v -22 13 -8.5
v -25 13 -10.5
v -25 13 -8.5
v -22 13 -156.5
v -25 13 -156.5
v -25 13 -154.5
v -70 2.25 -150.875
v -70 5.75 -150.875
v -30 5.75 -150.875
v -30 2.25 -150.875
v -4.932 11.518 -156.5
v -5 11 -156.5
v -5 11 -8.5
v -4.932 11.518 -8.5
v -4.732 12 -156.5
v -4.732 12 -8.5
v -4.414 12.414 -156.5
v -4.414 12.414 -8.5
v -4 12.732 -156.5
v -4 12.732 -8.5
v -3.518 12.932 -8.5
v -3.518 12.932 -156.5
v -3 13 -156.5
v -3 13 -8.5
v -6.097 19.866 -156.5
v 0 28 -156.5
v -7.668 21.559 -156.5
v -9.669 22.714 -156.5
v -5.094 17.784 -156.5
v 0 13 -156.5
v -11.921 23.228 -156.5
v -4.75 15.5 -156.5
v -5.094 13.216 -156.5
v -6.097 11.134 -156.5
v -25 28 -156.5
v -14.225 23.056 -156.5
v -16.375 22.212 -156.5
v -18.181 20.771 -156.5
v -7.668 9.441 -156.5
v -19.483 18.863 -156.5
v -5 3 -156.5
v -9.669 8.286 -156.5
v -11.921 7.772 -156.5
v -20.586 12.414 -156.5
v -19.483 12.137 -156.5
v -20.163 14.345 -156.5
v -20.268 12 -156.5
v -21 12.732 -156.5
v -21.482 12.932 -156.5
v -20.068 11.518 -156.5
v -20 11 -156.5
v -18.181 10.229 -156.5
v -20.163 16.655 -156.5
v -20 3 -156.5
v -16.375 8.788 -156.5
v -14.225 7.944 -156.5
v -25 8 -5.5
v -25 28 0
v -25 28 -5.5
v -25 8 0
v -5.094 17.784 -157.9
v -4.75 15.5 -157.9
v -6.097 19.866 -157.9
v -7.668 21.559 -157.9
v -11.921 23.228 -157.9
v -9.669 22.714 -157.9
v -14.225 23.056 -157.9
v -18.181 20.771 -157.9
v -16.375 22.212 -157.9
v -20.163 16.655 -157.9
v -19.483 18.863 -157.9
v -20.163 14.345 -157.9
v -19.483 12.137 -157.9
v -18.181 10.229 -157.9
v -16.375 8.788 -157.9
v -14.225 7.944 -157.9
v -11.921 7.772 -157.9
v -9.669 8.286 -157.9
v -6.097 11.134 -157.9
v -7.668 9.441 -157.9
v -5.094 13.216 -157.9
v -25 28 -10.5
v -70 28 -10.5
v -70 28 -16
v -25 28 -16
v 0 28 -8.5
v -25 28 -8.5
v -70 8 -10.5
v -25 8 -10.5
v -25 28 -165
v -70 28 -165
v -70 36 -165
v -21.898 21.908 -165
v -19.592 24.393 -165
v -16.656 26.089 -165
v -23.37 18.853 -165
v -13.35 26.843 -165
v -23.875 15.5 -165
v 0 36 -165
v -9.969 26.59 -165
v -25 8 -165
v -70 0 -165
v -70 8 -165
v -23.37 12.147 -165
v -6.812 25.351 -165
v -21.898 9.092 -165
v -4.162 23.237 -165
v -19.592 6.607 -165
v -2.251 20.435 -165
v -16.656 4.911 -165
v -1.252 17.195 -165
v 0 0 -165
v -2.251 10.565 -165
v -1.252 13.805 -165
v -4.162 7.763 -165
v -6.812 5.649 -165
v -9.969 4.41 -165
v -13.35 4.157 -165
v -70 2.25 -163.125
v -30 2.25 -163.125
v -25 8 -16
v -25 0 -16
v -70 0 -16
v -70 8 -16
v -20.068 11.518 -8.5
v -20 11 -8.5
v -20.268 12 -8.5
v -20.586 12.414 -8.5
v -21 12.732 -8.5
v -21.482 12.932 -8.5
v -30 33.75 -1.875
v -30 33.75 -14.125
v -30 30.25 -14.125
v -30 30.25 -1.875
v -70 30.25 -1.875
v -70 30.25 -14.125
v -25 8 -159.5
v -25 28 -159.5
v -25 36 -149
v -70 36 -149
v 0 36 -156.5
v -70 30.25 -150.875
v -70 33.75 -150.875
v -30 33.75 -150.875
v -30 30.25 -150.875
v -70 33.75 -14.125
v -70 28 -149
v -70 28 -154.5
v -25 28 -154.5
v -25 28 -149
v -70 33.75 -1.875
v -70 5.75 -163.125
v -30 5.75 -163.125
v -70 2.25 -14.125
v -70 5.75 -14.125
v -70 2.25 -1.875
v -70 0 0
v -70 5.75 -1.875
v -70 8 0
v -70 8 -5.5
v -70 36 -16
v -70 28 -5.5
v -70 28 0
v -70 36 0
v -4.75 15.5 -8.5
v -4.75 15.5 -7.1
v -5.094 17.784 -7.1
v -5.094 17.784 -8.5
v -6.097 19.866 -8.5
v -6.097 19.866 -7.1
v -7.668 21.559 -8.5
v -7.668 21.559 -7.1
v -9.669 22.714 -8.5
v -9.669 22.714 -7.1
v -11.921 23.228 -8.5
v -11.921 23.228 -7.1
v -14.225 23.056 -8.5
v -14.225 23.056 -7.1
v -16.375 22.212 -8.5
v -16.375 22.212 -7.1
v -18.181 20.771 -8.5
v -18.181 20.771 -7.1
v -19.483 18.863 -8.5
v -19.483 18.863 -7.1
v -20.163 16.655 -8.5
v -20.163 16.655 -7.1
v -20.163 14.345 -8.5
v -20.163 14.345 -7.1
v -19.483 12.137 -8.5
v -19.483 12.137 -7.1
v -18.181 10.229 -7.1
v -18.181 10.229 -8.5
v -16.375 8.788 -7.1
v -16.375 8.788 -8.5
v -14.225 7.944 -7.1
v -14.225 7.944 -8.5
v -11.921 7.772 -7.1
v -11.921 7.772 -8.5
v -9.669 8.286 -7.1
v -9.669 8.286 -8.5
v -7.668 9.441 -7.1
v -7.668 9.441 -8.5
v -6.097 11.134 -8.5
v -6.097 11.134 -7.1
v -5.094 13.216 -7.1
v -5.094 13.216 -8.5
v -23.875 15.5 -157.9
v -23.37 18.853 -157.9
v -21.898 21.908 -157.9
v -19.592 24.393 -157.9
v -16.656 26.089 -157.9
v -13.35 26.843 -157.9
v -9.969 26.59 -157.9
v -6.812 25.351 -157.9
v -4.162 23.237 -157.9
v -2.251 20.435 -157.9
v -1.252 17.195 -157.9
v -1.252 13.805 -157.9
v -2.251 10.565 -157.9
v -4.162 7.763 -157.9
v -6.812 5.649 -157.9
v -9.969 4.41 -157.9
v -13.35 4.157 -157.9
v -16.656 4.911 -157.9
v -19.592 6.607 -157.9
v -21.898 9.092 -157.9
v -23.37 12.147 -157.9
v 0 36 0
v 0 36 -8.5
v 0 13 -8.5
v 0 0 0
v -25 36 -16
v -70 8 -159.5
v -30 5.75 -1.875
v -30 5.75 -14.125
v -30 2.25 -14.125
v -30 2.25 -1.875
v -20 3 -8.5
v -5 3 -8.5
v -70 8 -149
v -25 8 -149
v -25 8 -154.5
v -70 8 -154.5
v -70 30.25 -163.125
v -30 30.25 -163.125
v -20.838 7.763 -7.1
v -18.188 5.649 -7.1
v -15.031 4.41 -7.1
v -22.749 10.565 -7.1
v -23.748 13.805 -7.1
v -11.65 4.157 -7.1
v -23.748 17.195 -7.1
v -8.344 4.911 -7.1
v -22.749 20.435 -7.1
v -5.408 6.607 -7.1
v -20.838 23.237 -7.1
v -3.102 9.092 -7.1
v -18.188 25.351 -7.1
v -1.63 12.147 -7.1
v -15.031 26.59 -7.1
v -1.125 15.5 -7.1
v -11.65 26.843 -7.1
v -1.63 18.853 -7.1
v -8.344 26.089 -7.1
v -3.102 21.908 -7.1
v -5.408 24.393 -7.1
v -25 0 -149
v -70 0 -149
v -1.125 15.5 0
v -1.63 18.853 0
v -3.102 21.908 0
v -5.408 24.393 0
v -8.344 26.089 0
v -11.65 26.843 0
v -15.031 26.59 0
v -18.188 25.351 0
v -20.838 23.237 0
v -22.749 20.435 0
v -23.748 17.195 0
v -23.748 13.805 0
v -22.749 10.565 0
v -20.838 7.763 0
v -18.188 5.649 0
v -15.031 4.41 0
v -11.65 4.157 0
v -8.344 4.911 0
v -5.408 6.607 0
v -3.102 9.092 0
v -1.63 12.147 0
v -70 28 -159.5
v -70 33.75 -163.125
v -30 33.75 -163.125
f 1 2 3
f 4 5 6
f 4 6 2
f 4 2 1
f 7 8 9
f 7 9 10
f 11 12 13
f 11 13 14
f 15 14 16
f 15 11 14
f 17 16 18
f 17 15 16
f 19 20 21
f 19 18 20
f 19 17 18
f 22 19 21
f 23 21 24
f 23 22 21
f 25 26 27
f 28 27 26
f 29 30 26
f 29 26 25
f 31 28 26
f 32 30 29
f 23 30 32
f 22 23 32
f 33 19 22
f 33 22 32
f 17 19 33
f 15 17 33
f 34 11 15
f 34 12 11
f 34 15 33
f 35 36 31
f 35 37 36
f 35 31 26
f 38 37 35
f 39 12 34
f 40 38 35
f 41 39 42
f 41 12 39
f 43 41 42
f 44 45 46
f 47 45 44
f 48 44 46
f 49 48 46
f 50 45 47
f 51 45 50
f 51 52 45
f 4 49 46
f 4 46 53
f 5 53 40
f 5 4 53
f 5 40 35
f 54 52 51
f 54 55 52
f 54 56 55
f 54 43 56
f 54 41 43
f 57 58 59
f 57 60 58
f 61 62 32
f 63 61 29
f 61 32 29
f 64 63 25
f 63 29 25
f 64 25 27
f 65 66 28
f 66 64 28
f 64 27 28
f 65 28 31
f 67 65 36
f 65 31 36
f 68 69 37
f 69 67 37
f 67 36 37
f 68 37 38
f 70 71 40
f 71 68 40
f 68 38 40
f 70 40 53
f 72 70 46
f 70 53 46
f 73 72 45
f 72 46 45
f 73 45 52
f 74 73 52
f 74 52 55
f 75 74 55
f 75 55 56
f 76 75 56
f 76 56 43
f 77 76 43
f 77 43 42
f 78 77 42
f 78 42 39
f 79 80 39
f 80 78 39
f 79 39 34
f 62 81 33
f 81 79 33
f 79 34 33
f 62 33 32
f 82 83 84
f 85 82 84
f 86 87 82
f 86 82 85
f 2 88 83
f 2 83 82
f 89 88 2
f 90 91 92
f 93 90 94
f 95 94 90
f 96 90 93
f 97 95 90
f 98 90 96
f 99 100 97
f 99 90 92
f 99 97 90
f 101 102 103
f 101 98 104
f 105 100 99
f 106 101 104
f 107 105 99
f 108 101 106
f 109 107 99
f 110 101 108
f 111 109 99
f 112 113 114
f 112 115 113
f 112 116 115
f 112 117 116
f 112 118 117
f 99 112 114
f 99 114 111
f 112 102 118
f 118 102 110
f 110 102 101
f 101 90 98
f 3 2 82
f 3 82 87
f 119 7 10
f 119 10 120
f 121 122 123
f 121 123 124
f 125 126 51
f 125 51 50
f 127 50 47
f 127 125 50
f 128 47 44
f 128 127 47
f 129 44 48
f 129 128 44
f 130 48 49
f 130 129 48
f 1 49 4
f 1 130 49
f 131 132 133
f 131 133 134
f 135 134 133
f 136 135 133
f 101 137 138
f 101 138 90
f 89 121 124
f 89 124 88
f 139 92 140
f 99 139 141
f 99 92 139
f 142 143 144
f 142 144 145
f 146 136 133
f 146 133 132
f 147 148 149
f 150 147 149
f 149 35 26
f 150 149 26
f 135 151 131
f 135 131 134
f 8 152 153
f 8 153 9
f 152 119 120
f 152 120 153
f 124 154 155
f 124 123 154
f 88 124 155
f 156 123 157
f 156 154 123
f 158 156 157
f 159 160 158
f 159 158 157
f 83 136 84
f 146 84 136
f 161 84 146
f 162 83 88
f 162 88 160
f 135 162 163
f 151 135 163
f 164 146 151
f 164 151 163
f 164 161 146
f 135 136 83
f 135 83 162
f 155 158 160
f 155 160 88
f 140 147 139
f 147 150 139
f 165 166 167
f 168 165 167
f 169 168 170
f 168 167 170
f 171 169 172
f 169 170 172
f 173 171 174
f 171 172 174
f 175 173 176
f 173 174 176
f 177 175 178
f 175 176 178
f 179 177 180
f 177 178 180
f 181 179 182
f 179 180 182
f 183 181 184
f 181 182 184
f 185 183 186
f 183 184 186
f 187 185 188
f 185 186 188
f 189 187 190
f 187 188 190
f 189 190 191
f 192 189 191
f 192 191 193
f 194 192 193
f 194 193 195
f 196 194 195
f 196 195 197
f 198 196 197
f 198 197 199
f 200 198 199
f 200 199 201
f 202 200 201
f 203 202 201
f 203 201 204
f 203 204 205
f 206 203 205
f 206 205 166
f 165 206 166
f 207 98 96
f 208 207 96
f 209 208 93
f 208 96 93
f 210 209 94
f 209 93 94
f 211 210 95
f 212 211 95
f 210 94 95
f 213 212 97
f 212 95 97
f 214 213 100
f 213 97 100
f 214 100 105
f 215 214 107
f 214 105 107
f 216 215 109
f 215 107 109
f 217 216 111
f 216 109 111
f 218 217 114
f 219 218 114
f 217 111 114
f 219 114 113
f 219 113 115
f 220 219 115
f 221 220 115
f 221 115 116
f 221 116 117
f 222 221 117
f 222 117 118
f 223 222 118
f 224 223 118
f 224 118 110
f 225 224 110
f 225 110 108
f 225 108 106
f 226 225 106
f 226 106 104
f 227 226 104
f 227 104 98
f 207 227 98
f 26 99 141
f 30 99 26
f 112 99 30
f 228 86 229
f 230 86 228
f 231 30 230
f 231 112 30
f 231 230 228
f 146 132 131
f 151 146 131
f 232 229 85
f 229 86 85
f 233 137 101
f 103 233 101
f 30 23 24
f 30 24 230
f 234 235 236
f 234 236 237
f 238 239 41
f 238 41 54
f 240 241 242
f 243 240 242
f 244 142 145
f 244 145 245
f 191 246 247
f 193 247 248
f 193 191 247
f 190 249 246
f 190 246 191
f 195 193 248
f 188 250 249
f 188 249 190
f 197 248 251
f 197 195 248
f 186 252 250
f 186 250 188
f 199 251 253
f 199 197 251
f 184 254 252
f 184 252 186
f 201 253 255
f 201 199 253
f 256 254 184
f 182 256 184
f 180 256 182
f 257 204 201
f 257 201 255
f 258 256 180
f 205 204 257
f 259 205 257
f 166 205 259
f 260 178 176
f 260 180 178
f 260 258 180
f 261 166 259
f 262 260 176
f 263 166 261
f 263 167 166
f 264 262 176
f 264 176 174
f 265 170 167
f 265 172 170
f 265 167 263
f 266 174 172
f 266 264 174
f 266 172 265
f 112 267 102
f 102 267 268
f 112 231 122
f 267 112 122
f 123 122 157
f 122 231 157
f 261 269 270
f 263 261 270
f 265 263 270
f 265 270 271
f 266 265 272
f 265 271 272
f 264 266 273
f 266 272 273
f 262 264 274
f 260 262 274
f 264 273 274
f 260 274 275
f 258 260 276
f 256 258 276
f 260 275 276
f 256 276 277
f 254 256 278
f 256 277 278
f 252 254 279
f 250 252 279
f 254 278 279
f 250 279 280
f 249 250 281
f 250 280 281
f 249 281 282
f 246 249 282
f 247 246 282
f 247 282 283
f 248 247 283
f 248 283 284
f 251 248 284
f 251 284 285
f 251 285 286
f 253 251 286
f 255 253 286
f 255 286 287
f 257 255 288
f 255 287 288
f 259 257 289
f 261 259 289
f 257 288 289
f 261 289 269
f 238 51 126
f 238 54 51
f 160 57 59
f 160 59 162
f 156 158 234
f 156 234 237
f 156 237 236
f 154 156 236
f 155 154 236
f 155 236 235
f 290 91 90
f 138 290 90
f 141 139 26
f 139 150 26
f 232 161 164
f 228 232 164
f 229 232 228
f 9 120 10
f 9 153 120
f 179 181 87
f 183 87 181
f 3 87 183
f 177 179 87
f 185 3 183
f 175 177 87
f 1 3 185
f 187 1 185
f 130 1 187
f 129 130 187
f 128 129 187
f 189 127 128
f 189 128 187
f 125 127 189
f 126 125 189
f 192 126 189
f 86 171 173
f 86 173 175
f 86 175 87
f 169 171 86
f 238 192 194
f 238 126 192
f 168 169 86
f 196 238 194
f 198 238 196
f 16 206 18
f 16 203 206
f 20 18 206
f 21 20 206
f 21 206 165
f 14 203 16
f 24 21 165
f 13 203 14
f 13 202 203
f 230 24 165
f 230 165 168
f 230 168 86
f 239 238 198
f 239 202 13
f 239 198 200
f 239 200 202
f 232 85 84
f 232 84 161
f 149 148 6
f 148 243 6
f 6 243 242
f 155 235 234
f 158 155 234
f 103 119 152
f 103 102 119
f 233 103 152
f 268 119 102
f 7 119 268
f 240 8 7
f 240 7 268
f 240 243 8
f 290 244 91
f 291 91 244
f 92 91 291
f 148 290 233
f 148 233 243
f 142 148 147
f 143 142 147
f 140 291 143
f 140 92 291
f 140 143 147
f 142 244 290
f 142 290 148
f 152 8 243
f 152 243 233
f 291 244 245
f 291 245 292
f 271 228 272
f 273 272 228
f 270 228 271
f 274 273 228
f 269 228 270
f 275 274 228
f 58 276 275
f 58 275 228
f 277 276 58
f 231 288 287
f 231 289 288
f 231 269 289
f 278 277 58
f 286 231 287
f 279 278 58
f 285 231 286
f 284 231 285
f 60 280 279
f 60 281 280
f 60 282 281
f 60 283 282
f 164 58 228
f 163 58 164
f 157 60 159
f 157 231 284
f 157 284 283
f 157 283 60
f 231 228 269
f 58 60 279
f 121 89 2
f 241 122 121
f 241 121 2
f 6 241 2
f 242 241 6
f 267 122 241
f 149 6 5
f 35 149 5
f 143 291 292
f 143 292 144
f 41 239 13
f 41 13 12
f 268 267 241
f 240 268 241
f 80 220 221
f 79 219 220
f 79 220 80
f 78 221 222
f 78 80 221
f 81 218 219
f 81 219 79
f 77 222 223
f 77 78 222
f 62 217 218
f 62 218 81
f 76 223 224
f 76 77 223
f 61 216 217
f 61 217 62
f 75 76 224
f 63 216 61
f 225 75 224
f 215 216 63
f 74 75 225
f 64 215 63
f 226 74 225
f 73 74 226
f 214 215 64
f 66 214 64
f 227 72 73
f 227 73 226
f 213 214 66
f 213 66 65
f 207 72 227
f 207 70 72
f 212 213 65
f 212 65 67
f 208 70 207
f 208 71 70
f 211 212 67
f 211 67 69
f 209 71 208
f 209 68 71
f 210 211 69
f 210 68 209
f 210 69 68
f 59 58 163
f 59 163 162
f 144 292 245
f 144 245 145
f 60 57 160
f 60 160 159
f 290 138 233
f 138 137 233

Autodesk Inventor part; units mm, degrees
ref_plane "YZ Plane" through (0, 0, 0) normal (1, 0, 0) x (0, 1, 0)
ref_plane "XZ Plane" through (0, 0, 0) normal (0, 1, 0) x (-1, 0, 0)
ref_plane "XY Plane" through (0, 0, 0) normal (0, 0, 1) x (1, 0, 0)
sketch "Sketch1" plane through (0, 0, 0) normal (0, 1, 0) x (-1, 0, 0)
  line L0 (0, 0) -> (25, 0)
  line L1 (25, 0) -> (25, -165)
  line L2 (25, -165) -> (0, -165)
  line L3 (0, -165) -> (0, 0)
  dimension "d0" = 25
  dimension "d1" = 165
extrude "Extrusion1" add sketch "Sketch1" along normal blind 3
sketch "Sketch2" plane through (0, 3, 0) normal (0, 1, 0) x (1, 0, 0)
  line L0 (0, 0) -> (0, 165) projected
  line L1 (-25, 165) -> (-25, 0) projected
  line L2 (0, 0) -> (-25, 0)
  line L3 (-25, 0) -> (-25, 8.5)
  line L4 (-25, 8.5) -> (0, 8.5)
  line L5 (0, 8.5) -> (0, 0)
  line L6 (-25, 165) -> (0, 165)
  line L7 (0, 165) -> (0, 156.5)
  line L8 (0, 156.5) -> (-25, 156.5)
  line L9 (-25, 156.5) -> (-25, 165)
  dimension "d4" = 8.5
  dimension "d5" = 8.5
extrude "Extrusion2" add sketch "Sketch2" along normal blind 25 contours L2 L1 L4 L0 | L8 L1 L6 L0
sketch "Sketch3" plane through (-25, 0, 0) normal (0, 0, 1) x (1, 0, 0)
  line L0 (0, 3) -> (0, 28) construction
  line L1 (25, 3) -> (25, 28) construction
  line L2 (0, 28) -> (25, 28) construction
  line L3 (25, 28) -> (25, 3) construction
  line L4 (25, 3) -> (0, 3) construction
  line L5 (0, 3) -> (0, 28) construction
  circle A0 centre (12.5, 15.5) radius 11
  point P0 (25, 0)
  dimension "d8" = 25
  dimension "d9" = 22
extrude "Extrusion3" cut sketch "Sketch3" against normal blind 7.1
sketch "Sketch4" plane through (-25, 0, 0) normal (0, 0, 1) x (1, 0, 0)
  circle A0 centre (12.5, 15.5) radius 11 projected
  circle A1 centre (12.5, 15.5) radius 7.75
  point P0 (25, 0)
  dimension "d12" = 15.5
extrude "Extrusion4" cut sketch "Sketch4" against normal blind 165 contours A1
sketch "Sketch5" plane through (0, 0, -165) normal (0, 0, -1) x (-1, 0, 0)
  circle A0 centre (12.5, 15.5) radius 7.75 projected
  circle A1 centre (12.5, 15.5) radius 11
  point P0 (0, 0)
extrude "Extrusion5" cut sketch "Sketch5" against normal blind 7.1
sketch "Sketch6" plane through (0, 3, 0) normal (0, 1, 0) x (1, 0, 0)
  line L0 (-25, 156.5) -> (-25, 8.5) projected
  line L1 (-20.25, 8.5) -> (-4.75, 8.5) projected
  line L2 (-25, 156.5) -> (-20, 156.5)
  line L3 (-20, 156.5) -> (-20, 8.5)
  line L4 (-20, 8.5) -> (-25, 8.5)
  line L5 (-25, 8.5) -> (-25, 156.5)
  line L6 (0, 8.5) -> (0, 156.5) projected
  line L7 (-4.75, 156.5) -> (-20.25, 156.5) projected
  line L8 (0, 8.5) -> (-5, 8.5)
  line L9 (-5, 8.5) -> (-5, 156.5)
  line L10 (-5, 156.5) -> (0, 156.5)
  line L11 (0, 156.5) -> (0, 8.5)
  point P0 (0, 0)
  dimension "d17" = 5
  dimension "d18" = 5
extrude "Extrusion6" add sketch "Sketch6" along normal blind 10 contours L2 L3 L1 L4 L0 | L7 L10 L6 L8 L1 L9
fillet "Fillet1" radius 2 2 edges at (-5, 13, -82.5) (-20, 13, -82.5)
sketch "Sketch7" plane through (-25, 0, 0) normal (0, 0, 1) x (1, 0, 0)
  point P0 (25, 0)
sketch "Sketch8" plane through (-25, 0, 0) normal (0, 0, 1) x (1, 0, 0)
  circle A0 centre (12.5, 15.5) radius 11 projected
  circle A1 centre (12.5, 15.5) radius 11
  circle A2 centre (12.5, 15.5) radius 11.375
  point P0 (25, 0)
  dimension "d22" = 22.75
extrude "Extrusion7" cut sketch "Sketch8" against normal blind 7.1
sketch "Sketch9" plane through (0, 0, -165) normal (0, 0, -1) x (-1, 0, 0)
  circle A0 centre (12.5, 15.5) radius 11.375 projected
  circle A1 centre (12.5, 15.5) radius 11.375
  point P0 (0, 0)
extrude "Extrusion8" cut sketch "Sketch9" against normal blind 7.1
sketch "Sketch10" plane through (-25, 0, -165) normal (-1, 0, 0) x (0, 0, 1)
  point P0 (165, 0)
sketch "Sketch11" plane through (-25, 0, -165) normal (-1, 0, 0) x (0, 0, 1)
  line L0 (165, 0) -> (0, 0) projected
  line L1 (0, 0) -> (16, 0)
  line L2 (16, 0) -> (16, 8)
  line L3 (16, 8) -> (0, 8)
  line L4 (0, 8) -> (0, 0)
  line L5 (165, 0) -> (149, 0)
  line L6 (149, 0) -> (149, 8)
  line L7 (149, 8) -> (165, 8)
  line L8 (165, 8) -> (165, 0)
  line L9 (8.5, 28) -> (0, 28) projected
  line L10 (0, 28) -> (16, 28)
  line L11 (16, 28) -> (16, 36)
  line L12 (16, 36) -> (0, 36)
  line L13 (0, 36) -> (0, 28)
  line L14 (165, 28) -> (156.5, 28) projected
  line L15 (165, 28) -> (149, 28)
  line L16 (149, 28) -> (149, 36)
  line L17 (149, 36) -> (165, 36)
  line L18 (165, 36) -> (165, 28)
  dimension "d27" = 16
  dimension "d28" = 8
  dimension "d29" = 16
  dimension "d30" = 16
  dimension "d31" = 8
  dimension "d32" = 16
extrude "Extrusion9" add sketch "Sketch11" along normal blind 45
sketch "Sketch12" plane through (0, 28, 0) normal (0, 1, 0) x (1, 0, 0)
  line L0 (-25, 0) -> (-70, 0) projected
  line L1 (0, 0) -> (-70, 0) projected
  line L2 (-25, 0) -> (0, 0)
  line L3 (0, 0) -> (0, 8.5) projected
  line L4 (0, 0) -> (0, 8.5)
  line L5 (-25, 16) -> (-25, 0) projected
  line L6 (0, 8.5) -> (-25, 16)
  line L7 (-25, 16) -> (-25, 0)
  line L8 (-25, 16) -> (-25, 149) projected
  line L9 (0, 156.5) -> (0, 165) projected
  line L10 (-25, 149) -> (0, 156.5)
  line L11 (0, 156.5) -> (0, 165)
  line L12 (-70, 165) -> (0, 165) projected
  line L13 (0, 165) -> (-25, 165)
  line L14 (-25, 149) -> (-25, 165)
extrude "Extrusion10" add sketch "Sketch12" along normal blind 8
sketch "Sketch13" plane through (-70, 0, -165) normal (-1, 0, 0) x (0, 0, 1)
  line L0 (0, 8) -> (16, 8) construction
  line L1 (0, 0) -> (16, 0) construction
  line L2 (0, 8) -> (16, 0) construction
  line L3 (14.125, 2.25) -> (1.875, 2.25)
  line L4 (1.875, 2.25) -> (1.875, 5.75)
  line L5 (1.875, 5.75) -> (14.125, 5.75)
  line L6 (14.125, 5.75) -> (14.125, 2.25)
  line L7 (14.125, 2.25) -> (1.875, 5.75) construction
  line L8 (1.875, 2.25) -> (14.125, 5.75) construction
  line L9 (0, 0) -> (0, 36) construction
  line L10 (16, 28) -> (8.5, 28) construction
  line L11 (0, 36) -> (16, 28) construction
  line L12 (14.125, 30.25) -> (1.875, 30.25)
  line L13 (1.875, 30.25) -> (1.875, 33.75)
  line L14 (1.875, 33.75) -> (14.125, 33.75)
  line L15 (14.125, 33.75) -> (14.125, 30.25)
  line L16 (14.125, 30.25) -> (1.875, 33.75) construction
  line L17 (1.875, 30.25) -> (14.125, 33.75) construction
  line L18 (149, 0) -> (149, 8) construction
  line L19 (0, 0) -> (165, 0) construction
  line L20 (149, 8) -> (165, 0) construction
  line L21 (165, 36) -> (149, 36) construction
  line L22 (149, 28) -> (165, 28) construction
  line L23 (149, 36) -> (165, 28) construction
  line L24 (163.125, 30.25) -> (150.875, 30.25)
  line L25 (150.875, 30.25) -> (150.875, 33.75)
  line L26 (150.875, 33.75) -> (163.125, 33.75)
  line L27 (163.125, 33.75) -> (163.125, 30.25)
  line L28 (163.125, 30.25) -> (150.875, 33.75) construction
  line L29 (150.875, 30.25) -> (163.125, 33.75) construction
  line L30 (163.125, 2.25) -> (150.875, 2.25)
  line L31 (150.875, 2.25) -> (150.875, 5.75)
  line L32 (150.875, 5.75) -> (163.125, 5.75)
  line L33 (163.125, 5.75) -> (163.125, 2.25)
  line L34 (163.125, 2.25) -> (150.875, 5.75) construction
  line L35 (150.875, 2.25) -> (163.125, 5.75) construction
  point P0 (8, 4)
  point P1 (8, 32)
  point P2 (157, 32)
  point P3 (157, 4)
  dimension "d37" = 12.25
  dimension "d38" = 3.5
  dimension "d39" = 12.25
  dimension "d40" = 3.5
  dimension "d41" = 12.25
  dimension "d42" = 3.5
  dimension "d43" = 12.25
extrude "Extrusion11" cut sketch "Sketch13" against normal blind 40
sketch "Sketch14" plane through (-25, 8, -149) normal (0, 1, 0) x (1, 0, 0)
  line L0 (0, 16) -> (0, 0) construction
  line L1 (0, 8) -> (0, 10.5) construction
  line L2 (-45, 0) -> (-45, 16) projected
  line L3 (0, 10.5) -> (-45, 10.5)
  line L4 (-45, 10.5) -> (-45, 5.5)
  line L5 (-45, 5.5) -> (0, 5.5)
  line L6 (0, 5.5) -> (0, 10.5)
  line L7 (0, -133) -> (0, -149) construction
  line L8 (0, -141) -> (0, -143.5) construction
  line L9 (-45, -149) -> (-45, -133) projected
  line L10 (0, -143.5) -> (-45, -143.5)
  line L11 (-45, -143.5) -> (-45, -138.5)
  line L12 (-45, -138.5) -> (0, -138.5)
  line L13 (0, -138.5) -> (0, -143.5)
  point P0 (25, -149)
  dimension "d46" = 2.5
  dimension "d47" = 5
  dimension "d48" = 2.5
  dimension "d49" = 5
extrude "Extrusion12" add sketch "Sketch14" along normal blind 20
properties part number "frontAxelHolder 10-23"
